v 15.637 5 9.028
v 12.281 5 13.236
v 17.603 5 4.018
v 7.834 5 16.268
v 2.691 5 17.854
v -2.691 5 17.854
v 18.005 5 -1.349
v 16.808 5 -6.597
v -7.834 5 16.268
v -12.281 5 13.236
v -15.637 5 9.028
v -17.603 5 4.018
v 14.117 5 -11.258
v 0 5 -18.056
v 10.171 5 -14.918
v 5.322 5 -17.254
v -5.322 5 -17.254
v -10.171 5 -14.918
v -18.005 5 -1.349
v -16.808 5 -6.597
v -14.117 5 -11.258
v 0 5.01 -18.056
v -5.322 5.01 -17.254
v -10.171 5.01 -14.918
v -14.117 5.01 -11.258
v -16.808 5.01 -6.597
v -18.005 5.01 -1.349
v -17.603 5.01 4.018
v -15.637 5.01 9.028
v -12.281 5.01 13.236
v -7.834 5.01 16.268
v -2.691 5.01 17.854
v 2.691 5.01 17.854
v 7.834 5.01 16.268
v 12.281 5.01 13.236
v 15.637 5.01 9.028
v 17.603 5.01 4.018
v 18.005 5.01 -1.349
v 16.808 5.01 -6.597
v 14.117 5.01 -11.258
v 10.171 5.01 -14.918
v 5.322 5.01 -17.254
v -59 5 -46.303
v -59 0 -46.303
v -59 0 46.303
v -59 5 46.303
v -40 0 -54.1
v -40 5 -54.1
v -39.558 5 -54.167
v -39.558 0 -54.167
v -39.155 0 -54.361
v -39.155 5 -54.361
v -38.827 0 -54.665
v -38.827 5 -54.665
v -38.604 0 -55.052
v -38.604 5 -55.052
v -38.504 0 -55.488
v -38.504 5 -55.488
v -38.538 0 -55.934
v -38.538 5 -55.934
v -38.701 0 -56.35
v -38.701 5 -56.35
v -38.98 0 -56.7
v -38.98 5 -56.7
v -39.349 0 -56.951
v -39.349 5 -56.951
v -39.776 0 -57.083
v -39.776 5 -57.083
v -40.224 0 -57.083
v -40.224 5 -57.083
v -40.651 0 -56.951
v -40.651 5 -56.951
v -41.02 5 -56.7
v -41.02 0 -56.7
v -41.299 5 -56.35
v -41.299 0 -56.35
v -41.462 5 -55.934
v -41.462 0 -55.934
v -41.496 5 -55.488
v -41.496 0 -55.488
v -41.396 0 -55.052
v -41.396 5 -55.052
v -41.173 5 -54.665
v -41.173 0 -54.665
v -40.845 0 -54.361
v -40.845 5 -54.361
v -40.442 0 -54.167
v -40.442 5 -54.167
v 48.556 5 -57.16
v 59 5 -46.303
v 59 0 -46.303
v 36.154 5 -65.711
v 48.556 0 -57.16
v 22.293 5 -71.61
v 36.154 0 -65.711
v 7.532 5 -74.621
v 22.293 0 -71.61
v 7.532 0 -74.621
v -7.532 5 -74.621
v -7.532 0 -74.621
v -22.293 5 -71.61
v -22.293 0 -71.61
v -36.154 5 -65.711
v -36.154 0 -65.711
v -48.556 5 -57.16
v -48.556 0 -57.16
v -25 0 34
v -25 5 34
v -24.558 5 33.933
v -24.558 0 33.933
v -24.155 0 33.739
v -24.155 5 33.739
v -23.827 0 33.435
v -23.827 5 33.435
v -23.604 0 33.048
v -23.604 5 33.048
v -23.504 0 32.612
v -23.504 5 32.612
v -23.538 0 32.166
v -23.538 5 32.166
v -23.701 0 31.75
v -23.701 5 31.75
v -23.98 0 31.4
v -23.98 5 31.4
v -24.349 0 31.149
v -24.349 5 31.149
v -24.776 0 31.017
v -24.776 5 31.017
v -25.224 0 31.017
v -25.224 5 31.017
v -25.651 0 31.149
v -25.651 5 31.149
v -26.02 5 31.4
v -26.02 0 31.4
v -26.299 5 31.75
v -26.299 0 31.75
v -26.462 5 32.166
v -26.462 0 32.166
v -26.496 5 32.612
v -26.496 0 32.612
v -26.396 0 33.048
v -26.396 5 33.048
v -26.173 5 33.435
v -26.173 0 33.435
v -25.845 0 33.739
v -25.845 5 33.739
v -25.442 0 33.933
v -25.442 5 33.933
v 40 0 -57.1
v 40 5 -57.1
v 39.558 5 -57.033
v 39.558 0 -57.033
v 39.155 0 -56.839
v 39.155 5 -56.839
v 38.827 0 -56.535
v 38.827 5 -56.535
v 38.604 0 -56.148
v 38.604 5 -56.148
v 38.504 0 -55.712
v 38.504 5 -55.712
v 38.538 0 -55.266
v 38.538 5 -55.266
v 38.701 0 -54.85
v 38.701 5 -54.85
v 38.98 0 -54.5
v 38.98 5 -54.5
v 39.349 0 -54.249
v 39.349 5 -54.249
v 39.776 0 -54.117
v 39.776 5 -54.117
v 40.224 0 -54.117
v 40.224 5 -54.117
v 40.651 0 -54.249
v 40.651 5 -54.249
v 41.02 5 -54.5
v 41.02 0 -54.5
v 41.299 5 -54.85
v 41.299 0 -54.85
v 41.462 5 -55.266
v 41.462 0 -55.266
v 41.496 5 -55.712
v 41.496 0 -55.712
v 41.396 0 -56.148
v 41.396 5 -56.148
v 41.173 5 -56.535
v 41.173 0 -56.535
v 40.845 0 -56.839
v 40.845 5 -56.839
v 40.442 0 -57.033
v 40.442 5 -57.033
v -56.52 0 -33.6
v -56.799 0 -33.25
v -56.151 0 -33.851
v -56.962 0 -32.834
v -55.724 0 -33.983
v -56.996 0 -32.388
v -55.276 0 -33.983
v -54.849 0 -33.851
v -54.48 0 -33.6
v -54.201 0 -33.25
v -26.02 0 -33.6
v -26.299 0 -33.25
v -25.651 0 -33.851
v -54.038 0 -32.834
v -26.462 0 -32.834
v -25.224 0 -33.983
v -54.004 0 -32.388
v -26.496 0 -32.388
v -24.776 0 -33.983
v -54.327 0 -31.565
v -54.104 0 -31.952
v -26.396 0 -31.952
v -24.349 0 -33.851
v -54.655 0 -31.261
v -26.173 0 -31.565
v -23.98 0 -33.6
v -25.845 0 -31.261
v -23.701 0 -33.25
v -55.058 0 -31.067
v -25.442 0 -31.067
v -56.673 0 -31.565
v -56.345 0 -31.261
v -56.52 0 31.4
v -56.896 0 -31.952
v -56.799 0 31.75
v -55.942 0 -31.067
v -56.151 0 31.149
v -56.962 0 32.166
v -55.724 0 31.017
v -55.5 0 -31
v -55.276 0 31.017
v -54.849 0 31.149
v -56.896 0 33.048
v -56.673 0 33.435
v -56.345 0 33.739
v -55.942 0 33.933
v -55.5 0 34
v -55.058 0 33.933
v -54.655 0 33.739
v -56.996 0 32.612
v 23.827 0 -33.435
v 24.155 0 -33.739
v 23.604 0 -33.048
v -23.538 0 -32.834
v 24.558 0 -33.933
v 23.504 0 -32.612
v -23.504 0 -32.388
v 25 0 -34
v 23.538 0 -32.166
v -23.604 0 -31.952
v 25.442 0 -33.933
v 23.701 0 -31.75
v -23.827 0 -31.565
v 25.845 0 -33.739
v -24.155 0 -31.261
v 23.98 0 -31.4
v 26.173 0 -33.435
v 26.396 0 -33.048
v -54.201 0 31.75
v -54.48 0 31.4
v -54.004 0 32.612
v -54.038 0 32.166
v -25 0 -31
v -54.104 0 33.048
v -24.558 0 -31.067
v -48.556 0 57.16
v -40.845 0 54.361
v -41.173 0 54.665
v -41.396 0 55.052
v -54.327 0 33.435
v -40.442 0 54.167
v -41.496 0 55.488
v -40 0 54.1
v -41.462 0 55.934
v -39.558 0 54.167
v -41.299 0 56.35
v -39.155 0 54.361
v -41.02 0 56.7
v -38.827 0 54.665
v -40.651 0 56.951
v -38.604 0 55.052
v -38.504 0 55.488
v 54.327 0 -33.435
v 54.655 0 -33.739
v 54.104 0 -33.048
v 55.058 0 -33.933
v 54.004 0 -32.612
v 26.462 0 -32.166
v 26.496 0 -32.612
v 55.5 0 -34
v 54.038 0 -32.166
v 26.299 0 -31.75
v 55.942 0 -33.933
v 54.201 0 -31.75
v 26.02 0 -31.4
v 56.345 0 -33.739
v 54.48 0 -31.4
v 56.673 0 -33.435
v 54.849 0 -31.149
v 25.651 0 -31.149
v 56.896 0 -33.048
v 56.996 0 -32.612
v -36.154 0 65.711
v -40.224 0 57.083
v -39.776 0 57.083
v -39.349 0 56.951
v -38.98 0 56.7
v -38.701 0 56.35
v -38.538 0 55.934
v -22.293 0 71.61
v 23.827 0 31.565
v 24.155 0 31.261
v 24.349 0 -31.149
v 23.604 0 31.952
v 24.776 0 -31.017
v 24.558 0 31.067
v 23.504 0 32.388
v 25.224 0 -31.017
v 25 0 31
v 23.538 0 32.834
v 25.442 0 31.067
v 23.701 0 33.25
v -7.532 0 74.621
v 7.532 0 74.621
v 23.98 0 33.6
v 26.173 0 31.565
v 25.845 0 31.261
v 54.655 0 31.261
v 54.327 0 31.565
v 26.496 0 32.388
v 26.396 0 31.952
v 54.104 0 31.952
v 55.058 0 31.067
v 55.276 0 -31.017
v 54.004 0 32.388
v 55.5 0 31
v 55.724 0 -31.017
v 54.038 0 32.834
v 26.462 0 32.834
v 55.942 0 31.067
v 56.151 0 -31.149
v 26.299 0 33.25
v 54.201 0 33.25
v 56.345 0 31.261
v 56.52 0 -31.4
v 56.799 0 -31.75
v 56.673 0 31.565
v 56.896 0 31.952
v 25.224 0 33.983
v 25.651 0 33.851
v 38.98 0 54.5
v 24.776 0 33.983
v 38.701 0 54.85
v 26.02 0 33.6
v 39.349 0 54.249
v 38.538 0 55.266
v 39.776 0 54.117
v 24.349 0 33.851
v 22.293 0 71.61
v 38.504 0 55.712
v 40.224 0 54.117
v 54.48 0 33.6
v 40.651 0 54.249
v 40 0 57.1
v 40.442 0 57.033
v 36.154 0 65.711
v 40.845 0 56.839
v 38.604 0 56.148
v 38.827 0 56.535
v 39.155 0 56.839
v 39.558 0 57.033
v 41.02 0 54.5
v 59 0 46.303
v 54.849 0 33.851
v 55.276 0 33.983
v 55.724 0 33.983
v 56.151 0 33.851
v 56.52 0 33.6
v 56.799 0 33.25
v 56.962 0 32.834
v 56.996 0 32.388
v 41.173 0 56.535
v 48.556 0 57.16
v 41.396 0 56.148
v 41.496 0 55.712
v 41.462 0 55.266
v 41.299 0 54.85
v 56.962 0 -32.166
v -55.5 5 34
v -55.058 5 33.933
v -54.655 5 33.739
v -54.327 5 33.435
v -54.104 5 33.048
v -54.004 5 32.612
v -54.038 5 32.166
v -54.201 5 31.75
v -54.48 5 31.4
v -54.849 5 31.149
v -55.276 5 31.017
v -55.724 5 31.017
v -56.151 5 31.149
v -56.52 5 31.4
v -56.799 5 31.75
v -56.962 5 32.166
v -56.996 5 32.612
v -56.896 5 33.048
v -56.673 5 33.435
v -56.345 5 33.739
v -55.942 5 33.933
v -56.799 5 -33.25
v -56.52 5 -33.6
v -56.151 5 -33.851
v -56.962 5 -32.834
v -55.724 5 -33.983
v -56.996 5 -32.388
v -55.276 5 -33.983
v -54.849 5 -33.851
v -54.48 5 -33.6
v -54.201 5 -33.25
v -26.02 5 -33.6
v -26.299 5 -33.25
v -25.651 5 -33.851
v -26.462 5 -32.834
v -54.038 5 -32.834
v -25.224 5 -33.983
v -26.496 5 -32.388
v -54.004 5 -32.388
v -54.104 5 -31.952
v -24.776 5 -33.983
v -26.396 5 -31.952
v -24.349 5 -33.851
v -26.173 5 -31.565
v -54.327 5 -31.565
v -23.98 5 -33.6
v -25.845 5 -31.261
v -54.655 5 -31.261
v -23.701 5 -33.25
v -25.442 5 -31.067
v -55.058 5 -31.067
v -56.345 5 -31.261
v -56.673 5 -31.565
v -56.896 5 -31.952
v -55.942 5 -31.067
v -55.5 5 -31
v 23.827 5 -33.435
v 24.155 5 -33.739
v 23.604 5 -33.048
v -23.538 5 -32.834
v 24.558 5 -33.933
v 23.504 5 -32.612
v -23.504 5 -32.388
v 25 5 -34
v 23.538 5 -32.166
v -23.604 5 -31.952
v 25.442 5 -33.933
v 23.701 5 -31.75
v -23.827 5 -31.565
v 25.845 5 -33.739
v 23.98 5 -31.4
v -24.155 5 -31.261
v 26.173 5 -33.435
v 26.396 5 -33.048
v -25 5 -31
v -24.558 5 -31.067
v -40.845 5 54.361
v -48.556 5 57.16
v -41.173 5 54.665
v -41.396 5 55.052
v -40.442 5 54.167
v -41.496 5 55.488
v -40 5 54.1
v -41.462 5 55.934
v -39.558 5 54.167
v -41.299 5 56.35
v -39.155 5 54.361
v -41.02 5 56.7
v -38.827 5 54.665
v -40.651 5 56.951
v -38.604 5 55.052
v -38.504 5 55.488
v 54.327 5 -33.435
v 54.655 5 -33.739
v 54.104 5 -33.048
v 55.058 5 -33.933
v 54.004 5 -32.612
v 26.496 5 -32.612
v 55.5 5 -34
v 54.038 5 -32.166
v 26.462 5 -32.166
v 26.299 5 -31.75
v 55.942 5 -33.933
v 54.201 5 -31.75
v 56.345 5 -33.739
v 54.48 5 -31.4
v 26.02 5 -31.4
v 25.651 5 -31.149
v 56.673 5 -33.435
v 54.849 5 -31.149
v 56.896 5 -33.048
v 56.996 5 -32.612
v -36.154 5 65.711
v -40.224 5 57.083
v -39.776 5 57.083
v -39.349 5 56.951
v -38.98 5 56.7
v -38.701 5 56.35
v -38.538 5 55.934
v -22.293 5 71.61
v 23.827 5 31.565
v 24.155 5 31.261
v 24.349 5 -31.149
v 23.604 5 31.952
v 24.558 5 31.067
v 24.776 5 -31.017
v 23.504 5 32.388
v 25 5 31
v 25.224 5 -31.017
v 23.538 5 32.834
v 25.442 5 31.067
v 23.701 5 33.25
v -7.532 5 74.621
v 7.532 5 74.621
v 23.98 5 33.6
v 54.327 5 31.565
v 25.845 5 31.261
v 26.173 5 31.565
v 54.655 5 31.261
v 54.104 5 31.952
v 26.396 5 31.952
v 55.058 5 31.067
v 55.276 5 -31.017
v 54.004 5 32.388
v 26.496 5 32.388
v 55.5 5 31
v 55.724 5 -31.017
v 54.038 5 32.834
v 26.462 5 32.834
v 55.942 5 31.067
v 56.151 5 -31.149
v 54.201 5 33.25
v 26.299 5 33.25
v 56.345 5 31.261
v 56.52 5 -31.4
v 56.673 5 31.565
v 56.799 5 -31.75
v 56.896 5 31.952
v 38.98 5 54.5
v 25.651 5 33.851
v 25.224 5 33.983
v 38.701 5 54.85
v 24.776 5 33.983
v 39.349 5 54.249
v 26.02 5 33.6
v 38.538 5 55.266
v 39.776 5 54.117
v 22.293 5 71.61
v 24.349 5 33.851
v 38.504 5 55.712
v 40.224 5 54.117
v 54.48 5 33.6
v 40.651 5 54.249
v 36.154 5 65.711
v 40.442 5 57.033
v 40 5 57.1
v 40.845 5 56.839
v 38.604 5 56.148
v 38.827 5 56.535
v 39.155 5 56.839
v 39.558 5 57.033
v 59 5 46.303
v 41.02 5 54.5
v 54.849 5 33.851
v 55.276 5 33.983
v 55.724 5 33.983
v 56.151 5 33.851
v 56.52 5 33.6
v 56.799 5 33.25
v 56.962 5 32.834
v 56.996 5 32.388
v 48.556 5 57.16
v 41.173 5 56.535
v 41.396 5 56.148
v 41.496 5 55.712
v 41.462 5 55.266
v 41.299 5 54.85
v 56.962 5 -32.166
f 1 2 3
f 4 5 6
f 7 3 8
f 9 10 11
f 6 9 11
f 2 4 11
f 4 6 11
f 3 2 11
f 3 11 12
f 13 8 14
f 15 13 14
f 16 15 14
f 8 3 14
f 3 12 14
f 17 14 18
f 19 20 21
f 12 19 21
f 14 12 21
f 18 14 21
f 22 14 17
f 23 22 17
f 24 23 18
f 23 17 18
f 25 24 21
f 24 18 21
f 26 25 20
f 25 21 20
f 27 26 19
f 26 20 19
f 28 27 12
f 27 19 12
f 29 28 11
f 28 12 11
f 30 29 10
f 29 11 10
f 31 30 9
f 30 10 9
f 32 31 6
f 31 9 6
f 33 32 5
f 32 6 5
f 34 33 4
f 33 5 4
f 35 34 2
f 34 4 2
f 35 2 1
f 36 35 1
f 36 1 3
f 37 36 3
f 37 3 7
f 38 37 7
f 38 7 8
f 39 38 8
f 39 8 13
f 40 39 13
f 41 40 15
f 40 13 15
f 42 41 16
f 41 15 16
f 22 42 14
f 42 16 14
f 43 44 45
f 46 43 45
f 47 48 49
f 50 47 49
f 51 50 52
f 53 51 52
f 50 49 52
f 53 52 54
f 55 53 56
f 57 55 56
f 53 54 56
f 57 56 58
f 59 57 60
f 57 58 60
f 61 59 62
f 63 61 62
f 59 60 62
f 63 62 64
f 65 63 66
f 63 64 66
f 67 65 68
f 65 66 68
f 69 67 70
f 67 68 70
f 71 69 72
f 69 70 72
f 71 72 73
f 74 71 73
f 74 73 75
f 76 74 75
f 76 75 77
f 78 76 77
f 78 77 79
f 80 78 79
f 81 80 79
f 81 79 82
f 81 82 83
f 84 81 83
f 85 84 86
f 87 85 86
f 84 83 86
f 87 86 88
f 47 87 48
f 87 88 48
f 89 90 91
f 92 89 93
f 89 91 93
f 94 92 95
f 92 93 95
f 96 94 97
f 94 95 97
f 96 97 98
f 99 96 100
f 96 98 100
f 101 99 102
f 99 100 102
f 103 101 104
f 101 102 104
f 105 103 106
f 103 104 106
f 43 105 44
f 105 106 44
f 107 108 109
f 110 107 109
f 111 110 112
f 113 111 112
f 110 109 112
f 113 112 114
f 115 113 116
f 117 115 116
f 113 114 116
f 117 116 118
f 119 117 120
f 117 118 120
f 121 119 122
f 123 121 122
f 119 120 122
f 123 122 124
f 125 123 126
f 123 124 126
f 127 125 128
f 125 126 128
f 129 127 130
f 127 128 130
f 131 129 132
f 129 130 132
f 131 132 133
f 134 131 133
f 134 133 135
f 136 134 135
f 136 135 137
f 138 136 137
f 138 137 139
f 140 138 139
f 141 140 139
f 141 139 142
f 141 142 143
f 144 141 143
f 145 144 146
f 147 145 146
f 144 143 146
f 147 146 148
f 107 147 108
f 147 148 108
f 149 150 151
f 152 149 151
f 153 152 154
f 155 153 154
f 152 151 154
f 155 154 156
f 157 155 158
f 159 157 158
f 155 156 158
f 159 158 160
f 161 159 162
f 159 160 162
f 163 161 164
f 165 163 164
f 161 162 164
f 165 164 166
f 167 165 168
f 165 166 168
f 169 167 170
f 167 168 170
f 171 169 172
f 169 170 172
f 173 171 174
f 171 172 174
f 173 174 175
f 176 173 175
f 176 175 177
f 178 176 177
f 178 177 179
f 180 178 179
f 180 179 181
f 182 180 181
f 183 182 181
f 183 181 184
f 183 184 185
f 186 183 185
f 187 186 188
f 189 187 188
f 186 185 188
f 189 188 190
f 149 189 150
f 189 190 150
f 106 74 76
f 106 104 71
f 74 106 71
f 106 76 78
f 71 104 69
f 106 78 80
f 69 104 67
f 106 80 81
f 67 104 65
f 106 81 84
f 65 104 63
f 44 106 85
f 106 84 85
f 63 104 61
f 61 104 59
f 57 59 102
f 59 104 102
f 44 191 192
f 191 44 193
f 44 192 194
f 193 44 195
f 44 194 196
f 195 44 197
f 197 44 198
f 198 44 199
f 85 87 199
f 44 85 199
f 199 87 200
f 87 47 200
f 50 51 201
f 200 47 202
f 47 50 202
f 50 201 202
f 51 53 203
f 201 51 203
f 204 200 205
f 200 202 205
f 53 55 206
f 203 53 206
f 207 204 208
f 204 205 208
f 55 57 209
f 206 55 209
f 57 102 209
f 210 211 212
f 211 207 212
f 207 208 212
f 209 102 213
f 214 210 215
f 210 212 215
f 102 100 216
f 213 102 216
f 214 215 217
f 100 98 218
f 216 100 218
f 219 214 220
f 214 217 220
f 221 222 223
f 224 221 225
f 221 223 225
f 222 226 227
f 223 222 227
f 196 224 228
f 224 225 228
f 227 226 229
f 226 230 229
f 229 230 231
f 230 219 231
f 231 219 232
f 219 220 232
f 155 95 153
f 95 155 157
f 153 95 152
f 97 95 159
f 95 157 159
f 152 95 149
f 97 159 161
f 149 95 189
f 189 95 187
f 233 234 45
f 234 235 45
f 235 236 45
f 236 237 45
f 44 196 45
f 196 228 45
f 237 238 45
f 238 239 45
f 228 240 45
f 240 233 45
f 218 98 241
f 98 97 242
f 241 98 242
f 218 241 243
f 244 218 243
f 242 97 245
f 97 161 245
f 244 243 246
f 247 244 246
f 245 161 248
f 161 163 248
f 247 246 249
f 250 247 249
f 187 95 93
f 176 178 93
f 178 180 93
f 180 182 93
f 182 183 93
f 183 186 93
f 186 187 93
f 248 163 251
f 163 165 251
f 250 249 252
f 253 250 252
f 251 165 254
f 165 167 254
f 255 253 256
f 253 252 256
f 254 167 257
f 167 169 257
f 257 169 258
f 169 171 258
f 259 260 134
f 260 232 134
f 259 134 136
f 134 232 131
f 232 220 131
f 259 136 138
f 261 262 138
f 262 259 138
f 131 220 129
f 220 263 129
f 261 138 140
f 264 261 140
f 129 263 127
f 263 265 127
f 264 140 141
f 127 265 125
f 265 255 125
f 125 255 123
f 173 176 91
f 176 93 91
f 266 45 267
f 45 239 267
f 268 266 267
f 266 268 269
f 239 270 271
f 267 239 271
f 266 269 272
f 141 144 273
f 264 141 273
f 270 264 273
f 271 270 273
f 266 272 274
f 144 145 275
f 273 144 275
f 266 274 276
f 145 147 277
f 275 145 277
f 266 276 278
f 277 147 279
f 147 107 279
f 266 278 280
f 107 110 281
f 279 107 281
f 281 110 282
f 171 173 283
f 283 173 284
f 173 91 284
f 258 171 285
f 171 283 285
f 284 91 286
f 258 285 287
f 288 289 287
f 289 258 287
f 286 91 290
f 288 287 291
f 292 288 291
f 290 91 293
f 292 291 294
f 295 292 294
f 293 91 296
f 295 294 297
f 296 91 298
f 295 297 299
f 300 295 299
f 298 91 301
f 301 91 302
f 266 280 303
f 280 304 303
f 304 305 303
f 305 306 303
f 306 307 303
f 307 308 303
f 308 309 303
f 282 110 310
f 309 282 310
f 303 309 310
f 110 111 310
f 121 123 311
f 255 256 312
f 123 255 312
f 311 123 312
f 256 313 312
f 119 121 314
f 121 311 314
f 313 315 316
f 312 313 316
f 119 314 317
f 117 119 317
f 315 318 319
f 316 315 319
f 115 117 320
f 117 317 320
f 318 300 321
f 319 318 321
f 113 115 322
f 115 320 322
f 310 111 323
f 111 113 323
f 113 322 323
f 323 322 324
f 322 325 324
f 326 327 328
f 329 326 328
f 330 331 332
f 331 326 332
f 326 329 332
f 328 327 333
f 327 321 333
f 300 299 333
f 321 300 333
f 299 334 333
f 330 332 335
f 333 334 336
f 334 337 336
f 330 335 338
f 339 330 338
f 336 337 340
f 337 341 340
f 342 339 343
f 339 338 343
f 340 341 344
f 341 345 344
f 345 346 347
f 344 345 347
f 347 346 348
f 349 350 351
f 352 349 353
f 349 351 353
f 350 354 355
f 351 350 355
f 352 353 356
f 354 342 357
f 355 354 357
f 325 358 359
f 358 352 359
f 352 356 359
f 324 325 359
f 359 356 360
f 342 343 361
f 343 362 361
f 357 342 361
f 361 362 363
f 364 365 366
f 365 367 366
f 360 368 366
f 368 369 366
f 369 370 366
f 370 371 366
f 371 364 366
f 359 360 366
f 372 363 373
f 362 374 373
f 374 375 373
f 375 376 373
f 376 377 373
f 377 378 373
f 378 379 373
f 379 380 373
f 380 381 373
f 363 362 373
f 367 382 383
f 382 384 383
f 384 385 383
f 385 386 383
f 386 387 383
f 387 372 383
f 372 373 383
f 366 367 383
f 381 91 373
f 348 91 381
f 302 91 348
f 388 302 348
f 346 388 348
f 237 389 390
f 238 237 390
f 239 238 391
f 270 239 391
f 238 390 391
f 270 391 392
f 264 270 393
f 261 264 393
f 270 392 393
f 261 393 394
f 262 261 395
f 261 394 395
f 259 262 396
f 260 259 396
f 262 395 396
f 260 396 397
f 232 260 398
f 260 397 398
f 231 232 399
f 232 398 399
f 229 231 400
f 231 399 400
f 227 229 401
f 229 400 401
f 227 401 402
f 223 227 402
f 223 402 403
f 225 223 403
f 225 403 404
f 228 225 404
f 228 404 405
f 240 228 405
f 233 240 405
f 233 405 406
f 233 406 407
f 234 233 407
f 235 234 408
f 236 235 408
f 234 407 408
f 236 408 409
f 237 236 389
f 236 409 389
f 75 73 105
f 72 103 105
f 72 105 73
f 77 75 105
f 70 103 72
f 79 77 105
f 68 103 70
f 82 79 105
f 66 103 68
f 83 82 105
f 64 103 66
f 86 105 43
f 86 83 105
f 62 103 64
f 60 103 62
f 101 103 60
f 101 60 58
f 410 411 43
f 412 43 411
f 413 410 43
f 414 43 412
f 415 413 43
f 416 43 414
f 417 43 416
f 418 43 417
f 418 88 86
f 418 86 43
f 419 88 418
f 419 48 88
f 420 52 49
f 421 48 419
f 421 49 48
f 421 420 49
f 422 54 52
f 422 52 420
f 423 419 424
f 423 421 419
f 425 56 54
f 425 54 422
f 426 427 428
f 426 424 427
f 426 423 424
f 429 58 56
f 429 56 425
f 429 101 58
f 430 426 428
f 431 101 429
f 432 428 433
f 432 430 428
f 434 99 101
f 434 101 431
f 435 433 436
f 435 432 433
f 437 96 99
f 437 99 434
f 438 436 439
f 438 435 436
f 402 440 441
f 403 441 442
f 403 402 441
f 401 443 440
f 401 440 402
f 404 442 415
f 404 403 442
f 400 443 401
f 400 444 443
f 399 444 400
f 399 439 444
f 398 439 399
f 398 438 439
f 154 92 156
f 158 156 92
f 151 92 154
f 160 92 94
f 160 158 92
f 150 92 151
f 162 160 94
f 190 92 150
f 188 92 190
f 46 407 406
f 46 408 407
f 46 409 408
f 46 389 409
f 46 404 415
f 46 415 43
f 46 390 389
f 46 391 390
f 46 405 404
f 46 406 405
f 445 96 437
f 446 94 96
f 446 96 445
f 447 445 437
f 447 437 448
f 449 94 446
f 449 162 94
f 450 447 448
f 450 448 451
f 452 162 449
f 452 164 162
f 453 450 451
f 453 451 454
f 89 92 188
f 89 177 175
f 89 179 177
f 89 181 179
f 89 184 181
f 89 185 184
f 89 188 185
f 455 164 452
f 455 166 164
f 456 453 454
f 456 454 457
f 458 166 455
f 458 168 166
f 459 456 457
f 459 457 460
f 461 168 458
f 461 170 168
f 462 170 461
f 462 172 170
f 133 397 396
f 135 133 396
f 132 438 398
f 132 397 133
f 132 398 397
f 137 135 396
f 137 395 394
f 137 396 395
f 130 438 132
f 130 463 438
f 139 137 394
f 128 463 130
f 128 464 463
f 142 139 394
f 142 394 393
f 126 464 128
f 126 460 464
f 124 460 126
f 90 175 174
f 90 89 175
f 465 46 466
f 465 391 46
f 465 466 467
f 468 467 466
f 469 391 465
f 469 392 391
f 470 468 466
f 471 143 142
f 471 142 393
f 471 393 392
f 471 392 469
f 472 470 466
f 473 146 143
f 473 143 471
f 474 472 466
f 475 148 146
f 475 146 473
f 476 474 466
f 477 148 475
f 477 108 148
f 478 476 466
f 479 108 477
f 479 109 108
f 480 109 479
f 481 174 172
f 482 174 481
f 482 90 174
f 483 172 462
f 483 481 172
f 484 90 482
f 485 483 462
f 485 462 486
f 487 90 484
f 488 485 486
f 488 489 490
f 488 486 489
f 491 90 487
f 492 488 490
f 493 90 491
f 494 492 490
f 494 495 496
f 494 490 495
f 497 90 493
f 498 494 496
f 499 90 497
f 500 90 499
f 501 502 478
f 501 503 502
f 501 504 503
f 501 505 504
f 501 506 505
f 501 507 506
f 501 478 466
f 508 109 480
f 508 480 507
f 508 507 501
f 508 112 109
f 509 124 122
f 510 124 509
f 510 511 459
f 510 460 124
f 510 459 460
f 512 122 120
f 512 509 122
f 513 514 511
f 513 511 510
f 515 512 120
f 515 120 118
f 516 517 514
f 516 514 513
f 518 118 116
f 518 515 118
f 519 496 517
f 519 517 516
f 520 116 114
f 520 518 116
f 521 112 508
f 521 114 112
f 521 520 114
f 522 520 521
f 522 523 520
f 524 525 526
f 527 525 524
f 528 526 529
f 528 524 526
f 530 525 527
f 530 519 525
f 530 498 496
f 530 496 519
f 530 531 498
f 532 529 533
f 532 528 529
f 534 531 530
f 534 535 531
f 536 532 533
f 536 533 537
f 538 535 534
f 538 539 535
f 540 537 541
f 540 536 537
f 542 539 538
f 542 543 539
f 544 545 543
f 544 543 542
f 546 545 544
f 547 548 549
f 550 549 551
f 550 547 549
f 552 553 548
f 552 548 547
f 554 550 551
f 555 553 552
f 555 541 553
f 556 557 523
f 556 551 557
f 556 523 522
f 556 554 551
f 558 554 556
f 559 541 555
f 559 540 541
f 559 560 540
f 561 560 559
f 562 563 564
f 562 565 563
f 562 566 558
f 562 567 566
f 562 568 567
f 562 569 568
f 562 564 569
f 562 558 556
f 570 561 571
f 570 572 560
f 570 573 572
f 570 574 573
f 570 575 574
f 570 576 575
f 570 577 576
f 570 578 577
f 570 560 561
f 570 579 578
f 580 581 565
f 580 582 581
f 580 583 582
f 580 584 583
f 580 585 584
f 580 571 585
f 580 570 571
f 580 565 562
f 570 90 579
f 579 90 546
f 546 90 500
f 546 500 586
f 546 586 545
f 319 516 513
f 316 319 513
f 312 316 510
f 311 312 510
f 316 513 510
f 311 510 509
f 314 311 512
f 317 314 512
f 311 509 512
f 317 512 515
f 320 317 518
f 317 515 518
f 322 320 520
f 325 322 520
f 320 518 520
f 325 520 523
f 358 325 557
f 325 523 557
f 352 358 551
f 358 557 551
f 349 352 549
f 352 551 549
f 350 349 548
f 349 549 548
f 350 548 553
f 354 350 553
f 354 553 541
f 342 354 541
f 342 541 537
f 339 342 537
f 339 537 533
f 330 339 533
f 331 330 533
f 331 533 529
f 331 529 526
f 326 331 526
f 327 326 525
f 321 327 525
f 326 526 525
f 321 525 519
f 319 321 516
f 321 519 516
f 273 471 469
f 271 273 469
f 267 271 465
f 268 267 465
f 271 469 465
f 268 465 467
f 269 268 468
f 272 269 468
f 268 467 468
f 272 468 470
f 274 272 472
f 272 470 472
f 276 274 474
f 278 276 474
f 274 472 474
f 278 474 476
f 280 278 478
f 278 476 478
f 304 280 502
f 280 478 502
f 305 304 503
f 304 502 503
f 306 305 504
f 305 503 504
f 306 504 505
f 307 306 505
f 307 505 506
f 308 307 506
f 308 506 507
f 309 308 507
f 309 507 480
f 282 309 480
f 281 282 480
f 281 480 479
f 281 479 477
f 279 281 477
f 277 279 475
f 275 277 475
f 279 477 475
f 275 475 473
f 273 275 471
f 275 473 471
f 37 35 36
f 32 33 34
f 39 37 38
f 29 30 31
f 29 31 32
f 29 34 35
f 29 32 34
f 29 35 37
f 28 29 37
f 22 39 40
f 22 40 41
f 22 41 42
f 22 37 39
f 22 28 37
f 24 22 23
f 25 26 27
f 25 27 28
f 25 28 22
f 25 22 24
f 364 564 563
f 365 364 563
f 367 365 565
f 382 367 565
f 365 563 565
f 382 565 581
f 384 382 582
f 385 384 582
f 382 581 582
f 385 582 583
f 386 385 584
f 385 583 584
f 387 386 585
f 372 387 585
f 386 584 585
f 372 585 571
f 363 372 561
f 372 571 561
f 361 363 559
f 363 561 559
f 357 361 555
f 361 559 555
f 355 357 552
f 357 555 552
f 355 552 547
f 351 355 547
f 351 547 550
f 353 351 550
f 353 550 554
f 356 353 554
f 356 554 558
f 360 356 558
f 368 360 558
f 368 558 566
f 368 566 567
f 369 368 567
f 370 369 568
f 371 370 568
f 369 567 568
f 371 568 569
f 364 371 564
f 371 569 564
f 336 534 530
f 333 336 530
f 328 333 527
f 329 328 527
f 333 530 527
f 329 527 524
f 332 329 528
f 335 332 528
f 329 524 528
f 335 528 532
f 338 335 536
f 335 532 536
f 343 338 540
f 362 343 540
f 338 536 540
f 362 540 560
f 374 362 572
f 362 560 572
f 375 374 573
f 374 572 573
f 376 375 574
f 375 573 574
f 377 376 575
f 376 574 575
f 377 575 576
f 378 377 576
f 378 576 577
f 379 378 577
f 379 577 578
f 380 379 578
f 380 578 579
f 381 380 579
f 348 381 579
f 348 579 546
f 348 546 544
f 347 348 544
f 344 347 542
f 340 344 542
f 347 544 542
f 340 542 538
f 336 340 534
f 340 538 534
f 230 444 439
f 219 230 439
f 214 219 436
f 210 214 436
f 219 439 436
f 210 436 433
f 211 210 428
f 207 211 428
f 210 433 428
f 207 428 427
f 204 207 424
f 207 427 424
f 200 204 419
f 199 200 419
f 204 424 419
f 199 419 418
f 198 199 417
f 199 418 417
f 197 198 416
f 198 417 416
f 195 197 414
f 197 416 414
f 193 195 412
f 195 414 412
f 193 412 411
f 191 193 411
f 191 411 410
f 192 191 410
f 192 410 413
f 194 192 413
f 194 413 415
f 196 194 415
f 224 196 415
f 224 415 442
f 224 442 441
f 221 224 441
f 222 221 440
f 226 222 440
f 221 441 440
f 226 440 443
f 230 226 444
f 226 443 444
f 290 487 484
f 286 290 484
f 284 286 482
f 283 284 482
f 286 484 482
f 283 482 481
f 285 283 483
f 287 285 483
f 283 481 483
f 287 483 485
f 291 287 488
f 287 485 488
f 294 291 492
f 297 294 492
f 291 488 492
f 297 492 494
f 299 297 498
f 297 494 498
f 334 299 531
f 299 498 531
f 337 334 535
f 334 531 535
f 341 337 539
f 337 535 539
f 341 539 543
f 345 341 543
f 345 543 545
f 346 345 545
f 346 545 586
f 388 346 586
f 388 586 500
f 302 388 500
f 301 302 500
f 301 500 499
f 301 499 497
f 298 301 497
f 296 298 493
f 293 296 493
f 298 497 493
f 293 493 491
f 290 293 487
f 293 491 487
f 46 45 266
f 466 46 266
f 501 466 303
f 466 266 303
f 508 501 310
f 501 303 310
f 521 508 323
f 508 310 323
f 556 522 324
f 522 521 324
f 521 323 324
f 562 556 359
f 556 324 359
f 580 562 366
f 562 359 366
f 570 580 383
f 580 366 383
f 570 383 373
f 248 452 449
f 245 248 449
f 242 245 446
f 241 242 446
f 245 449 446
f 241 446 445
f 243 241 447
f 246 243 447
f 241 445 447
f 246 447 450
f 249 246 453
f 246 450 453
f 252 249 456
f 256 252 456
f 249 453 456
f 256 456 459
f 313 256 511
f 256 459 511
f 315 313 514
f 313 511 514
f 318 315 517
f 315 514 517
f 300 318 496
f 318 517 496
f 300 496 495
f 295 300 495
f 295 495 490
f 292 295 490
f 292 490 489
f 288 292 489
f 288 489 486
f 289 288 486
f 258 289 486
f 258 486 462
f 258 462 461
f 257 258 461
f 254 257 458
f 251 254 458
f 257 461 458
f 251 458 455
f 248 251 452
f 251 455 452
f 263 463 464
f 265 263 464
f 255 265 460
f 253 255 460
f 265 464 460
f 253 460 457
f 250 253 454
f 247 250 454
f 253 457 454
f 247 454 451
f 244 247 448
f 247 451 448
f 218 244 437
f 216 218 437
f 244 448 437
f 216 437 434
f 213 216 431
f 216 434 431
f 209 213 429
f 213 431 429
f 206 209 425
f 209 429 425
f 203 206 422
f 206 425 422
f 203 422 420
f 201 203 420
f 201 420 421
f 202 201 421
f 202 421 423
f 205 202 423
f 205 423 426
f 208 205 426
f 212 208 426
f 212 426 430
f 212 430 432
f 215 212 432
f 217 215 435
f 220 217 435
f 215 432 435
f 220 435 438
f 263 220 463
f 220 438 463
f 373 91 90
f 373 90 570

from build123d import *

# Parameters (mm, degrees)
SKETCH1_R               = 75
TRAY_DEPTH              = 5
SKETCH2_R               = 1.5
SUPPORT_HOLES_DEPTH     = 5
SKETCH4_R               = 1.5
MOTORDRIVER_HOLES_DEPTH = 5
CUT_EXTRUDE1_START      = -10
CUT_EXTRUDE1_DEPTH      = 10
SKETCH7_R               = 18.055784347
BOSS_EXTRUDE1_DEPTH     = 0.01


with BuildPart() as part:
    # Sketch1 → Tray (new body)
    with BuildSketch(Plane(origin=(0, 0, 0), x_dir=(1, 0, 0), z_dir=(0, 1, 0))):
        with Locations(Location((0, 0, 0), (0, 0, 270))):
            Circle(SKETCH1_R)
    extrude(amount=TRAY_DEPTH)

    # Sketch2 → Support Holes (cut)
    with BuildSketch(Plane(origin=(0, 5, 0), x_dir=(1, 0, 0), z_dir=(0, 1, 0))):
        with Locations(Location((-40, 55.6, 0), (0, 0, 270))):
            Circle(SKETCH2_R)
        with Locations(Location((40, 55.6, 0), (0, 0, 90))):
            Circle(SKETCH2_R)
        with Locations(Location((40, -55.6, 0), (0, 0, 270))):
            Circle(SKETCH2_R)
        with Locations(Location((-40, -55.6, 0), (0, 0, 90))):
            Circle(SKETCH2_R)
    extrude(amount=-SUPPORT_HOLES_DEPTH, mode=Mode.SUBTRACT)

    # Sketch4 → MotorDriver Holes (cut)
    with BuildSketch(Plane(origin=(0, 5, 0), x_dir=(1, 0, 0), z_dir=(0, 1, 0))):
        with Locations(Location((-55.5, 32.5, 0), (0, 0, 270))):
            Circle(SKETCH4_R)
        with Locations(Location((-25, 32.5, 0), (0, 0, 270))):
            Circle(SKETCH4_R)
        with Locations(Location((-55.5, -32.5, 0), (0, 0, 270))):
            Circle(SKETCH4_R)
        with Locations(Location((-25, -32.5, 0), (0, 0, 270))):
            Circle(SKETCH4_R)
        with Locations(Location((55.5, -32.5, 0), (0, 0, 90))):
            Circle(SKETCH4_R)
        with Locations(Location((25, -32.5, 0), (0, 0, 90))):
            Circle(SKETCH4_R)
        with Locations(Location((25, 32.5, 0), (0, 0, 90))):
            Circle(SKETCH4_R)
        with Locations(Location((55.5, 32.5, 0), (0, 0, 90))):
            Circle(SKETCH4_R)
    extrude(amount=-MOTORDRIVER_HOLES_DEPTH, mode=Mode.SUBTRACT)

    # Sketch6 → Cut-Extrude1 (cut)
    with BuildSketch(Plane(origin=(0, 5, 0), x_dir=(1, 0, 0), z_dir=(0, 1, 0)).offset(CUT_EXTRUDE1_START)):
        with BuildLine():
            Line((-59, 46.303347611), (-59, -46.303347611))
            ThreePointArc((-59, -46.303347611), (-75, 0), (-59, 46.303347611))
        make_face()
        with BuildLine():
            Line((59, 46.303347611), (59, -46.303347611))
            ThreePointArc((59, -46.303347611), (75, 0), (59, 46.303347611))
        make_face()
    extrude(amount=CUT_EXTRUDE1_DEPTH, mode=Mode.SUBTRACT)


with BuildPart() as body_2:
    # Sketch7 → Boss-Extrude1 (new body)
    with BuildSketch(Plane(origin=(0, 5, 0), x_dir=(1, 0, 0), z_dir=(0, 1, 0))):
        with Locations(Location((0, 0, 0), (0, 0, 90))):
            Circle(SKETCH7_R)
    extrude(amount=BOSS_EXTRUDE1_DEPTH)


solid = Compound([part.part, body_2.part])
